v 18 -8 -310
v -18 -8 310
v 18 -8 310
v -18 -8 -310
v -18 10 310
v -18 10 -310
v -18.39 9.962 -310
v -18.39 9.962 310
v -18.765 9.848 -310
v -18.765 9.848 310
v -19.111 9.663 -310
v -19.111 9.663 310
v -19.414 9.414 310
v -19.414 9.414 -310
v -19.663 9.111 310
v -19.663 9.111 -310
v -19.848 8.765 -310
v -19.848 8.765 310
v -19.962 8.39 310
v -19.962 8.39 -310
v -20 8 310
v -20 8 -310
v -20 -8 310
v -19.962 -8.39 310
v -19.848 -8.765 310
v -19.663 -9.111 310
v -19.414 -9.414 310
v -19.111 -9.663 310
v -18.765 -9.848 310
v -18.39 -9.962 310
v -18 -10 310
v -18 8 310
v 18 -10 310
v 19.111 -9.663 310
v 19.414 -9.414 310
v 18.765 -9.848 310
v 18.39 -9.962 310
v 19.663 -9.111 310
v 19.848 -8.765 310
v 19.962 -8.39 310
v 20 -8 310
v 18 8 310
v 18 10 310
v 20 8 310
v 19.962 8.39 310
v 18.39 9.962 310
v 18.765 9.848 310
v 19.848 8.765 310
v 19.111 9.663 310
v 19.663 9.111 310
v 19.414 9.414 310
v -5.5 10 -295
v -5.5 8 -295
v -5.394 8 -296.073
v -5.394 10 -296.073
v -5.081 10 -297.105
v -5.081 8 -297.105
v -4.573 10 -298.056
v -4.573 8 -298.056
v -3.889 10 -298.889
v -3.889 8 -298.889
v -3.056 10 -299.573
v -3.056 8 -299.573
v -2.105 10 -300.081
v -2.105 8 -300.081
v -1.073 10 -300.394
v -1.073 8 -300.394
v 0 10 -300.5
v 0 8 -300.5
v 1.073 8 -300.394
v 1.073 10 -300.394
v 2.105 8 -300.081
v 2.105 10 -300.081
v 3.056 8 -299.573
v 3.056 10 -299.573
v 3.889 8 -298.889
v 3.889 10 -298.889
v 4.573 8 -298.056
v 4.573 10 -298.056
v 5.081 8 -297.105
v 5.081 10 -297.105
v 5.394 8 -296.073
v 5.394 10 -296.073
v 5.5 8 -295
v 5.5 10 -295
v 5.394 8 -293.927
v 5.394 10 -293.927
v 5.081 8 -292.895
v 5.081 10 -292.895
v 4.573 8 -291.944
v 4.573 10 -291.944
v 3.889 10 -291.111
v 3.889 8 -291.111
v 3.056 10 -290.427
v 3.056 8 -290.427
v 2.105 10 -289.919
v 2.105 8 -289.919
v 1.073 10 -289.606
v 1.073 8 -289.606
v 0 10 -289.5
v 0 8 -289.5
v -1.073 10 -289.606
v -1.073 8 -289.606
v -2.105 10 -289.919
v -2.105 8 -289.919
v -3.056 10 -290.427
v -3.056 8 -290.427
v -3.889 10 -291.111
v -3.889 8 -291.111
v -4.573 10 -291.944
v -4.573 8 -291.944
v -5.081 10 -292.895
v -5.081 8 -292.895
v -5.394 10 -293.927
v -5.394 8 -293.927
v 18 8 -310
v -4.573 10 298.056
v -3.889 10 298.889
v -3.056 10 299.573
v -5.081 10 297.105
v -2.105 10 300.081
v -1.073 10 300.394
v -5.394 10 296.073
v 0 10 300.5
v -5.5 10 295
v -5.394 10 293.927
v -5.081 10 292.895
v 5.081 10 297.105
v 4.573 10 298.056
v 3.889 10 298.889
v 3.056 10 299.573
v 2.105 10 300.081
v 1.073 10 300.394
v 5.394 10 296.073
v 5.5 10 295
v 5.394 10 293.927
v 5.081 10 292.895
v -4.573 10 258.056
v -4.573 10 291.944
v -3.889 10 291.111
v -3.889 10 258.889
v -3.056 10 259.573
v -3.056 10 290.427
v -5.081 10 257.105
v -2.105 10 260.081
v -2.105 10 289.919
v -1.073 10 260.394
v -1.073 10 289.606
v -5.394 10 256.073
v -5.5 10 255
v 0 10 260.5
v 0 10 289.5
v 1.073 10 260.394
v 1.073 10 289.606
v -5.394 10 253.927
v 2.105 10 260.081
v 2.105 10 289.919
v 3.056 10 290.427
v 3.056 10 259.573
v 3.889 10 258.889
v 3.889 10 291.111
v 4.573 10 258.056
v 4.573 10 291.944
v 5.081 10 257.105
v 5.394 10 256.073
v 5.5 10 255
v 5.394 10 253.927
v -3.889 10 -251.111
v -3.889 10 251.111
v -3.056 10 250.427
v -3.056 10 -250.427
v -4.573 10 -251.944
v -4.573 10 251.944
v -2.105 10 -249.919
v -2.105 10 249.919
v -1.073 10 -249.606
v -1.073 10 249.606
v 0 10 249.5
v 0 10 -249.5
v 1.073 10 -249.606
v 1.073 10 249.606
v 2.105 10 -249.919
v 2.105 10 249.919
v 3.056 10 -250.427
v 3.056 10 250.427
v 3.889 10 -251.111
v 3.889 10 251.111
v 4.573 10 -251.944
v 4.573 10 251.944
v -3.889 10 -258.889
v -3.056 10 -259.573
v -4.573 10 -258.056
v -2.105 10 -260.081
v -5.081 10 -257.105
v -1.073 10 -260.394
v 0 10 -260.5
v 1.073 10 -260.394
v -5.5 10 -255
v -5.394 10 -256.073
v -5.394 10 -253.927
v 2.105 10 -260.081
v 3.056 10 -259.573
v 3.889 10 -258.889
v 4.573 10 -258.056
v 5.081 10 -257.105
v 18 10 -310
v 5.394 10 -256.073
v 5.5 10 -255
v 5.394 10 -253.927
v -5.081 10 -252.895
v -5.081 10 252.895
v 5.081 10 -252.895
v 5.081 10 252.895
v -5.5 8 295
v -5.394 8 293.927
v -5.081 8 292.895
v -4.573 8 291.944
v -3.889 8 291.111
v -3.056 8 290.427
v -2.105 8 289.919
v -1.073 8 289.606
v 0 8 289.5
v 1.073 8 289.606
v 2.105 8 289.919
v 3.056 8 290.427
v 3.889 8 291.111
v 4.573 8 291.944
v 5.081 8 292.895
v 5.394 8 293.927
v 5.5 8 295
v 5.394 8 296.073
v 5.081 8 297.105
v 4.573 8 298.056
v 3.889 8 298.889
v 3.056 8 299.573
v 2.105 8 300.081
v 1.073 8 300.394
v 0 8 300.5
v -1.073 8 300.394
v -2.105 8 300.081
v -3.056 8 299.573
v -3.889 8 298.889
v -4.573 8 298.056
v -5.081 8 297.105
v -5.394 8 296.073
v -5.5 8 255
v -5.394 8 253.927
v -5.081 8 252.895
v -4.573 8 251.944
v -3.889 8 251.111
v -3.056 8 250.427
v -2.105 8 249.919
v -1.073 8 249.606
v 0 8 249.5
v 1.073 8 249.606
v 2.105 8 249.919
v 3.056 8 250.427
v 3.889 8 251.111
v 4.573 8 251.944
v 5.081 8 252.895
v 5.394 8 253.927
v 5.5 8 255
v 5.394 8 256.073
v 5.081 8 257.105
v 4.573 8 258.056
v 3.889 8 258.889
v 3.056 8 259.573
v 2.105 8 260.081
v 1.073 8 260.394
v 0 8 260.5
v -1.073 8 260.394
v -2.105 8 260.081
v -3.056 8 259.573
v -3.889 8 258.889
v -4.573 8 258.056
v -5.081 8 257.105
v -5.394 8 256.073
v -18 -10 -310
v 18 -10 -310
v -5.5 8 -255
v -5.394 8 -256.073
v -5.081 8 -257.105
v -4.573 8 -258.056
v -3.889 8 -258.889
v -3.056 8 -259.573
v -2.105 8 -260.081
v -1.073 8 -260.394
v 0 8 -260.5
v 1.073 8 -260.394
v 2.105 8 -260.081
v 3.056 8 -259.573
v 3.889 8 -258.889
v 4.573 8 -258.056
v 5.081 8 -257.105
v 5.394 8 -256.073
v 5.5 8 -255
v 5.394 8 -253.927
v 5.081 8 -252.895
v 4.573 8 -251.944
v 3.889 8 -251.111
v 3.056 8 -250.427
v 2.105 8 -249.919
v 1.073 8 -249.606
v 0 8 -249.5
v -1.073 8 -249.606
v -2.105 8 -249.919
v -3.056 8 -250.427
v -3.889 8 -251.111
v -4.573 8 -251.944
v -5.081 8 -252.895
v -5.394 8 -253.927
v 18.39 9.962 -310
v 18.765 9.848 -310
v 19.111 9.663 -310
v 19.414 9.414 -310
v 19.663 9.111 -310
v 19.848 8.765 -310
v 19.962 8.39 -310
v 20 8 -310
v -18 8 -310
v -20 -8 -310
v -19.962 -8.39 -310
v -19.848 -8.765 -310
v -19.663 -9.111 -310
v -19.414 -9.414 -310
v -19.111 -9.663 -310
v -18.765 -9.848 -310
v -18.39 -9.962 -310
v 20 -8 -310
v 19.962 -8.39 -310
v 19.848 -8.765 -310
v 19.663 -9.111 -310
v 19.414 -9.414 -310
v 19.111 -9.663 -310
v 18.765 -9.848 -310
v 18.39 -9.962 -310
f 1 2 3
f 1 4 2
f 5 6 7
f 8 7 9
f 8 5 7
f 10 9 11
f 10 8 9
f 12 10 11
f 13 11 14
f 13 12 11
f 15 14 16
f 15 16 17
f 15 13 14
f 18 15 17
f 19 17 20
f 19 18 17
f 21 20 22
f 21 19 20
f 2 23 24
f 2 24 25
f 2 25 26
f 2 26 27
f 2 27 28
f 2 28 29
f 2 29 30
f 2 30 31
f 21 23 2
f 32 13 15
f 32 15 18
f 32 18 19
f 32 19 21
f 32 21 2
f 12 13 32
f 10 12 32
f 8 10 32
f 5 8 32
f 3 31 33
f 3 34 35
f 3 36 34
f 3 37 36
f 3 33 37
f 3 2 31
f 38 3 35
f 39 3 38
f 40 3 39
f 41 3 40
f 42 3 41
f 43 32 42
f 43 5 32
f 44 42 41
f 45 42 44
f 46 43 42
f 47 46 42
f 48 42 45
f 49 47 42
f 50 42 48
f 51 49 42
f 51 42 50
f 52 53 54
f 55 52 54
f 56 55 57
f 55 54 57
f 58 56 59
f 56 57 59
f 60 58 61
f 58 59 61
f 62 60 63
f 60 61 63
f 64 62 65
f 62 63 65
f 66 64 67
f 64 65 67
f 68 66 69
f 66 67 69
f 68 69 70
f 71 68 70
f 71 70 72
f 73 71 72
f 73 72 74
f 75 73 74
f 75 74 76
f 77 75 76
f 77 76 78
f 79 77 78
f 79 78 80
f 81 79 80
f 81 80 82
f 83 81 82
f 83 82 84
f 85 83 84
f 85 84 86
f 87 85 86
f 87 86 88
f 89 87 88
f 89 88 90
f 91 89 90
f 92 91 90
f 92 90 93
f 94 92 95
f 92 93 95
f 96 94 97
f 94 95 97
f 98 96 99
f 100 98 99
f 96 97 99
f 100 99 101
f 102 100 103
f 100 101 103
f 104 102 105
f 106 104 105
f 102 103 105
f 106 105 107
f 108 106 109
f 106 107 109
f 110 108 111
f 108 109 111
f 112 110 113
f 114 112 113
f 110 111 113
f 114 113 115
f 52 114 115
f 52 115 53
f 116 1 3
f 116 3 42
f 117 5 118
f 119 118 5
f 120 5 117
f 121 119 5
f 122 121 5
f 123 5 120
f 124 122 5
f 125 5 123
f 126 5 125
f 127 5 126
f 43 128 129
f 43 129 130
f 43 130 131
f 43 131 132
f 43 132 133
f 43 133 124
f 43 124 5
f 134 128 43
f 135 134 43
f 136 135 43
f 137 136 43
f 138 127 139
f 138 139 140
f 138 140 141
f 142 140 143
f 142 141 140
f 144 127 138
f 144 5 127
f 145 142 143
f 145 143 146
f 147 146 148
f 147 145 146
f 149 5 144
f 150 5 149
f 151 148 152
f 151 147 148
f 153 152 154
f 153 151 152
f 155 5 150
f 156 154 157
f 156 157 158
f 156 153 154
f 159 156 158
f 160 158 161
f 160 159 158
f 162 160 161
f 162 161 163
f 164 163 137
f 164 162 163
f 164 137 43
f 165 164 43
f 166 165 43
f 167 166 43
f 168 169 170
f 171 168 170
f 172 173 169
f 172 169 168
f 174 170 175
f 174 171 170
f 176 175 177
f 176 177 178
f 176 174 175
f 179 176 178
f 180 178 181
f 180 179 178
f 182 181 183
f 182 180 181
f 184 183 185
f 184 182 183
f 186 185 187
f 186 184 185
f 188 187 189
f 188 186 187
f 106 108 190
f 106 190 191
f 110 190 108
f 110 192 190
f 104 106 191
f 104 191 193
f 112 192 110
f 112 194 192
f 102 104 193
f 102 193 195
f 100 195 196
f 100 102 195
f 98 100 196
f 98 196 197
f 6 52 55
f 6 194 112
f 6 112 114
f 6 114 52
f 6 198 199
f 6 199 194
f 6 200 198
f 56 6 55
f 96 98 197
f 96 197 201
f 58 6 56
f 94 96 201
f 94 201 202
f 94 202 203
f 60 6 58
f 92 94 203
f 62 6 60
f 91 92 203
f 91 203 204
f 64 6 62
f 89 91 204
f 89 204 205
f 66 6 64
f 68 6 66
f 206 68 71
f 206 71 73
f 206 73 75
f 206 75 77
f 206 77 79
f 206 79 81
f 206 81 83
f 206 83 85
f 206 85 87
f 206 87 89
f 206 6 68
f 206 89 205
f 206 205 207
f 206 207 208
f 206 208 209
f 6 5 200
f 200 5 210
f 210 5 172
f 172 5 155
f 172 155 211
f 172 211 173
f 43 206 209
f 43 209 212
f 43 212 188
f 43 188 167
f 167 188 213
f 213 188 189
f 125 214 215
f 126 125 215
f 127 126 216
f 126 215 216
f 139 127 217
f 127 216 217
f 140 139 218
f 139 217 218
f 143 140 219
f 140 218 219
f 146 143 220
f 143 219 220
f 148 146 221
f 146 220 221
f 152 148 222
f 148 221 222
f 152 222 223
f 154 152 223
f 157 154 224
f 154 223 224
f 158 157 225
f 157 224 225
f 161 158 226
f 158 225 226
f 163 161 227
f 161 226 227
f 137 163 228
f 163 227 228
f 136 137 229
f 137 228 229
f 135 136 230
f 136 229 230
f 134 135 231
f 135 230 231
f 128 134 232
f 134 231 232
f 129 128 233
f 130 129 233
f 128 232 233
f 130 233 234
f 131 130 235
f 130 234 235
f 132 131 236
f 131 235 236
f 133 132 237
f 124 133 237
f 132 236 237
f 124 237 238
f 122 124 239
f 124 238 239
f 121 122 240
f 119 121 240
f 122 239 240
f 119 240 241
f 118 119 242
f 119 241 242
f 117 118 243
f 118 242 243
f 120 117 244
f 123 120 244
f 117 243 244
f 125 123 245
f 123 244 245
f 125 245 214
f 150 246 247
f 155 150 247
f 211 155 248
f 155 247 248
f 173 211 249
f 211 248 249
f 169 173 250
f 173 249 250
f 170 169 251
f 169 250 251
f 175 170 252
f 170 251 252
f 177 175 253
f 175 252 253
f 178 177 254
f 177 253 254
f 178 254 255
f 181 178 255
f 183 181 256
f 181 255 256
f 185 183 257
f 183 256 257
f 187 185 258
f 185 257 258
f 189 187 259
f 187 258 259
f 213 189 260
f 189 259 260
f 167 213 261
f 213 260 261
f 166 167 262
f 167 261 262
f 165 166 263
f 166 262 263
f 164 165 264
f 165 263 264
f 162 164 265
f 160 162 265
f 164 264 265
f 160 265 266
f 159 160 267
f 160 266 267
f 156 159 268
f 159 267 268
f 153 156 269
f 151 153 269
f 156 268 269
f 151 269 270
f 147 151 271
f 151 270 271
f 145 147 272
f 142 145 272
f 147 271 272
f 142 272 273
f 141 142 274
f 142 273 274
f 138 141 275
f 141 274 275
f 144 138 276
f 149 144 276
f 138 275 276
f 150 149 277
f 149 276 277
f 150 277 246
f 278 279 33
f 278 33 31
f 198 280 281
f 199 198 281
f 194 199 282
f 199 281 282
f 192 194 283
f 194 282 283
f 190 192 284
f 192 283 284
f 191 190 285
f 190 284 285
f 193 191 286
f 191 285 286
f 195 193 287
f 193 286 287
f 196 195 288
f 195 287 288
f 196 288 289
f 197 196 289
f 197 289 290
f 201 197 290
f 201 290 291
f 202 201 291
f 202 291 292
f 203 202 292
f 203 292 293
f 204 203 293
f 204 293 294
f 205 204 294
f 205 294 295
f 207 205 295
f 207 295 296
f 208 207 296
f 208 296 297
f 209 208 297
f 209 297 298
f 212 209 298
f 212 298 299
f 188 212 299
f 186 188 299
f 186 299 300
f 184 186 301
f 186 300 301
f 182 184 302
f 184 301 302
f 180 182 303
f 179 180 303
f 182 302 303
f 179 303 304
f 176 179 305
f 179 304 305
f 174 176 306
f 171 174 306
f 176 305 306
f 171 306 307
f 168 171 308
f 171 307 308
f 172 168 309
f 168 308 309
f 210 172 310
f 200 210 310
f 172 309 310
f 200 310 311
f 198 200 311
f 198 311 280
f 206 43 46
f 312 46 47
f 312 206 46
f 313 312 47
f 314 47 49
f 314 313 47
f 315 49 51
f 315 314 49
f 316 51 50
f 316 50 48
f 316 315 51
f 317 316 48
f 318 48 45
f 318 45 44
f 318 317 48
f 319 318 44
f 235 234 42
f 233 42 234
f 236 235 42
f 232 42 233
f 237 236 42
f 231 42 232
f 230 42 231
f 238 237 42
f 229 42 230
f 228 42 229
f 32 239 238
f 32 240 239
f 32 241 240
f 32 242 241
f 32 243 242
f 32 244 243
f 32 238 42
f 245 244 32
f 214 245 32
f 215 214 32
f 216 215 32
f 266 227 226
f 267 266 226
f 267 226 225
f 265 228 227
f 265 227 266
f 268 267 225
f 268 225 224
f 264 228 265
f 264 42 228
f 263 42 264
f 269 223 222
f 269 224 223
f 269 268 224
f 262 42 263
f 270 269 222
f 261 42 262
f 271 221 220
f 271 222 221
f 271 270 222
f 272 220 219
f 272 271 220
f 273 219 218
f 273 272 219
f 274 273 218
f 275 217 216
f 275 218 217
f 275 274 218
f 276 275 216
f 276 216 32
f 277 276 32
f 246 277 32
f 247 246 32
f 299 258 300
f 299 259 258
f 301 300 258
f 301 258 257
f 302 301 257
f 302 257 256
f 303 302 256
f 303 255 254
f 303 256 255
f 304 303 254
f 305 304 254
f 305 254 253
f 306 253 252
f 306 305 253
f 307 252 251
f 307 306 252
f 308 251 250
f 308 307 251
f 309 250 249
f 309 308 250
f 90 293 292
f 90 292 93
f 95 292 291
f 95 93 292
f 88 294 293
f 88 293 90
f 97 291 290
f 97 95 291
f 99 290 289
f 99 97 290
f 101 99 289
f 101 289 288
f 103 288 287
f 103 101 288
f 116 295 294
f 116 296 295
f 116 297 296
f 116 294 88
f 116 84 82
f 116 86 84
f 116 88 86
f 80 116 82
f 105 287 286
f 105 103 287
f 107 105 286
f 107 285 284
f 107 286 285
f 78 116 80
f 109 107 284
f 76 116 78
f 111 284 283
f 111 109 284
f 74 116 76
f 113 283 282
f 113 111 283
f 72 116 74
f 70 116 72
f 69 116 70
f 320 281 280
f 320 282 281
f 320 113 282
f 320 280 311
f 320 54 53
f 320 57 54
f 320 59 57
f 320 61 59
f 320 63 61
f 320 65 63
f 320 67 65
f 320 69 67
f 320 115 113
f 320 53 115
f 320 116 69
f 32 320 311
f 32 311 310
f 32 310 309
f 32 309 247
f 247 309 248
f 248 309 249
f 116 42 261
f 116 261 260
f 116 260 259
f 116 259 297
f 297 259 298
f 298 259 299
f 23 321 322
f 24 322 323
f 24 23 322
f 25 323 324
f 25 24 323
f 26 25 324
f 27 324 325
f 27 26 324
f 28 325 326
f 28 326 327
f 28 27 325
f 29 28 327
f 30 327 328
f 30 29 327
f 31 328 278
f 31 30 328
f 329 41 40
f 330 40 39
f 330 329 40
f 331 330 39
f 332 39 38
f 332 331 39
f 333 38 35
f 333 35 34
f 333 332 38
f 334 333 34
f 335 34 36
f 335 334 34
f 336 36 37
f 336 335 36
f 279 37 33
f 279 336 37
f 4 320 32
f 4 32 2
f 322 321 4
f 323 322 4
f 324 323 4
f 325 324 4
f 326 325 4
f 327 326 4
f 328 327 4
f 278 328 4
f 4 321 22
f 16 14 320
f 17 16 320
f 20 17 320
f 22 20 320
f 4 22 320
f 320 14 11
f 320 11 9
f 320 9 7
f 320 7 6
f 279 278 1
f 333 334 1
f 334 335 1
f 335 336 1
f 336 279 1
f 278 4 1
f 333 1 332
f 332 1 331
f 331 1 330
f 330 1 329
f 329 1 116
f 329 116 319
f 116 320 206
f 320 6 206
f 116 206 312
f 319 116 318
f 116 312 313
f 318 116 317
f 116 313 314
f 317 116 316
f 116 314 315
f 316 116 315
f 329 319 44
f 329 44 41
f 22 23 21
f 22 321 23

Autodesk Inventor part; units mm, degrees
ref_plane "YZ Plane" through (0, 0, 0) normal (1, 0, 0) x (0, 1, 0)
ref_plane "XZ Plane" through (0, 0, 0) normal (0, 1, 0) x (-1, 0, 0)
ref_plane "XY Plane" through (0, 0, 0) normal (0, 0, 1) x (1, 0, 0)
sketch "Sketch1" plane through (0, 0, 0) normal (0, 0, 1) x (1, 0, 0)
  line L0 (-20, 10) -> (20, 10)
  line L1 (20, 10) -> (20, -10)
  line L2 (20, -10) -> (-20, -10)
  line L3 (-20, -10) -> (-20, 10)
  line L4 (-20, 10) -> (20, -10) construction
  line L5 (20, 10) -> (-20, -10) construction
  line L6 (18, 8) -> (-18, 8)
  line L7 (-18, 8) -> (-18, -8)
  line L8 (-18, -8) -> (18, -8)
  line L9 (18, -8) -> (18, 8)
  point P0 (0, 0)
  dimension "d0" = 40
  dimension "d1" = 20
  dimension "d2" = 2
extrude "Extrusion1" add sketch "Sketch1" along normal mid plane 620
fillet "Fillet1" radius 2 4 edges at (-20, 10, 0) (-20, -10, 0) (20, -10, 0) (20, 10, 0)
sketch "Sketch4" plane through (0, 0, 0) normal (0, 1, 0) x (-1, 0, 0)
  circle A0 centre (0, 255) radius 5.5
  line L0 (46.2729, 0) -> (-46.2729, 0) construction
  line L1 (-18, 310) -> (18, 310) projected
  circle A1 centre (0, 295) radius 5.5
  point P0 (0, 0)
  point P1 (0, 0)
  point P2 (0, 310)
  dimension "d20" = 11
  dimension "d21" = 55
  dimension "d24" = 40
extrude "Extrusion4" cut sketch "Sketch4" along normal through all
mirror "Mirror3" about plane through (0, 0, 0) normal (0, 0, 1) of "Extrusion4"
properties part number "Short tube 3"
